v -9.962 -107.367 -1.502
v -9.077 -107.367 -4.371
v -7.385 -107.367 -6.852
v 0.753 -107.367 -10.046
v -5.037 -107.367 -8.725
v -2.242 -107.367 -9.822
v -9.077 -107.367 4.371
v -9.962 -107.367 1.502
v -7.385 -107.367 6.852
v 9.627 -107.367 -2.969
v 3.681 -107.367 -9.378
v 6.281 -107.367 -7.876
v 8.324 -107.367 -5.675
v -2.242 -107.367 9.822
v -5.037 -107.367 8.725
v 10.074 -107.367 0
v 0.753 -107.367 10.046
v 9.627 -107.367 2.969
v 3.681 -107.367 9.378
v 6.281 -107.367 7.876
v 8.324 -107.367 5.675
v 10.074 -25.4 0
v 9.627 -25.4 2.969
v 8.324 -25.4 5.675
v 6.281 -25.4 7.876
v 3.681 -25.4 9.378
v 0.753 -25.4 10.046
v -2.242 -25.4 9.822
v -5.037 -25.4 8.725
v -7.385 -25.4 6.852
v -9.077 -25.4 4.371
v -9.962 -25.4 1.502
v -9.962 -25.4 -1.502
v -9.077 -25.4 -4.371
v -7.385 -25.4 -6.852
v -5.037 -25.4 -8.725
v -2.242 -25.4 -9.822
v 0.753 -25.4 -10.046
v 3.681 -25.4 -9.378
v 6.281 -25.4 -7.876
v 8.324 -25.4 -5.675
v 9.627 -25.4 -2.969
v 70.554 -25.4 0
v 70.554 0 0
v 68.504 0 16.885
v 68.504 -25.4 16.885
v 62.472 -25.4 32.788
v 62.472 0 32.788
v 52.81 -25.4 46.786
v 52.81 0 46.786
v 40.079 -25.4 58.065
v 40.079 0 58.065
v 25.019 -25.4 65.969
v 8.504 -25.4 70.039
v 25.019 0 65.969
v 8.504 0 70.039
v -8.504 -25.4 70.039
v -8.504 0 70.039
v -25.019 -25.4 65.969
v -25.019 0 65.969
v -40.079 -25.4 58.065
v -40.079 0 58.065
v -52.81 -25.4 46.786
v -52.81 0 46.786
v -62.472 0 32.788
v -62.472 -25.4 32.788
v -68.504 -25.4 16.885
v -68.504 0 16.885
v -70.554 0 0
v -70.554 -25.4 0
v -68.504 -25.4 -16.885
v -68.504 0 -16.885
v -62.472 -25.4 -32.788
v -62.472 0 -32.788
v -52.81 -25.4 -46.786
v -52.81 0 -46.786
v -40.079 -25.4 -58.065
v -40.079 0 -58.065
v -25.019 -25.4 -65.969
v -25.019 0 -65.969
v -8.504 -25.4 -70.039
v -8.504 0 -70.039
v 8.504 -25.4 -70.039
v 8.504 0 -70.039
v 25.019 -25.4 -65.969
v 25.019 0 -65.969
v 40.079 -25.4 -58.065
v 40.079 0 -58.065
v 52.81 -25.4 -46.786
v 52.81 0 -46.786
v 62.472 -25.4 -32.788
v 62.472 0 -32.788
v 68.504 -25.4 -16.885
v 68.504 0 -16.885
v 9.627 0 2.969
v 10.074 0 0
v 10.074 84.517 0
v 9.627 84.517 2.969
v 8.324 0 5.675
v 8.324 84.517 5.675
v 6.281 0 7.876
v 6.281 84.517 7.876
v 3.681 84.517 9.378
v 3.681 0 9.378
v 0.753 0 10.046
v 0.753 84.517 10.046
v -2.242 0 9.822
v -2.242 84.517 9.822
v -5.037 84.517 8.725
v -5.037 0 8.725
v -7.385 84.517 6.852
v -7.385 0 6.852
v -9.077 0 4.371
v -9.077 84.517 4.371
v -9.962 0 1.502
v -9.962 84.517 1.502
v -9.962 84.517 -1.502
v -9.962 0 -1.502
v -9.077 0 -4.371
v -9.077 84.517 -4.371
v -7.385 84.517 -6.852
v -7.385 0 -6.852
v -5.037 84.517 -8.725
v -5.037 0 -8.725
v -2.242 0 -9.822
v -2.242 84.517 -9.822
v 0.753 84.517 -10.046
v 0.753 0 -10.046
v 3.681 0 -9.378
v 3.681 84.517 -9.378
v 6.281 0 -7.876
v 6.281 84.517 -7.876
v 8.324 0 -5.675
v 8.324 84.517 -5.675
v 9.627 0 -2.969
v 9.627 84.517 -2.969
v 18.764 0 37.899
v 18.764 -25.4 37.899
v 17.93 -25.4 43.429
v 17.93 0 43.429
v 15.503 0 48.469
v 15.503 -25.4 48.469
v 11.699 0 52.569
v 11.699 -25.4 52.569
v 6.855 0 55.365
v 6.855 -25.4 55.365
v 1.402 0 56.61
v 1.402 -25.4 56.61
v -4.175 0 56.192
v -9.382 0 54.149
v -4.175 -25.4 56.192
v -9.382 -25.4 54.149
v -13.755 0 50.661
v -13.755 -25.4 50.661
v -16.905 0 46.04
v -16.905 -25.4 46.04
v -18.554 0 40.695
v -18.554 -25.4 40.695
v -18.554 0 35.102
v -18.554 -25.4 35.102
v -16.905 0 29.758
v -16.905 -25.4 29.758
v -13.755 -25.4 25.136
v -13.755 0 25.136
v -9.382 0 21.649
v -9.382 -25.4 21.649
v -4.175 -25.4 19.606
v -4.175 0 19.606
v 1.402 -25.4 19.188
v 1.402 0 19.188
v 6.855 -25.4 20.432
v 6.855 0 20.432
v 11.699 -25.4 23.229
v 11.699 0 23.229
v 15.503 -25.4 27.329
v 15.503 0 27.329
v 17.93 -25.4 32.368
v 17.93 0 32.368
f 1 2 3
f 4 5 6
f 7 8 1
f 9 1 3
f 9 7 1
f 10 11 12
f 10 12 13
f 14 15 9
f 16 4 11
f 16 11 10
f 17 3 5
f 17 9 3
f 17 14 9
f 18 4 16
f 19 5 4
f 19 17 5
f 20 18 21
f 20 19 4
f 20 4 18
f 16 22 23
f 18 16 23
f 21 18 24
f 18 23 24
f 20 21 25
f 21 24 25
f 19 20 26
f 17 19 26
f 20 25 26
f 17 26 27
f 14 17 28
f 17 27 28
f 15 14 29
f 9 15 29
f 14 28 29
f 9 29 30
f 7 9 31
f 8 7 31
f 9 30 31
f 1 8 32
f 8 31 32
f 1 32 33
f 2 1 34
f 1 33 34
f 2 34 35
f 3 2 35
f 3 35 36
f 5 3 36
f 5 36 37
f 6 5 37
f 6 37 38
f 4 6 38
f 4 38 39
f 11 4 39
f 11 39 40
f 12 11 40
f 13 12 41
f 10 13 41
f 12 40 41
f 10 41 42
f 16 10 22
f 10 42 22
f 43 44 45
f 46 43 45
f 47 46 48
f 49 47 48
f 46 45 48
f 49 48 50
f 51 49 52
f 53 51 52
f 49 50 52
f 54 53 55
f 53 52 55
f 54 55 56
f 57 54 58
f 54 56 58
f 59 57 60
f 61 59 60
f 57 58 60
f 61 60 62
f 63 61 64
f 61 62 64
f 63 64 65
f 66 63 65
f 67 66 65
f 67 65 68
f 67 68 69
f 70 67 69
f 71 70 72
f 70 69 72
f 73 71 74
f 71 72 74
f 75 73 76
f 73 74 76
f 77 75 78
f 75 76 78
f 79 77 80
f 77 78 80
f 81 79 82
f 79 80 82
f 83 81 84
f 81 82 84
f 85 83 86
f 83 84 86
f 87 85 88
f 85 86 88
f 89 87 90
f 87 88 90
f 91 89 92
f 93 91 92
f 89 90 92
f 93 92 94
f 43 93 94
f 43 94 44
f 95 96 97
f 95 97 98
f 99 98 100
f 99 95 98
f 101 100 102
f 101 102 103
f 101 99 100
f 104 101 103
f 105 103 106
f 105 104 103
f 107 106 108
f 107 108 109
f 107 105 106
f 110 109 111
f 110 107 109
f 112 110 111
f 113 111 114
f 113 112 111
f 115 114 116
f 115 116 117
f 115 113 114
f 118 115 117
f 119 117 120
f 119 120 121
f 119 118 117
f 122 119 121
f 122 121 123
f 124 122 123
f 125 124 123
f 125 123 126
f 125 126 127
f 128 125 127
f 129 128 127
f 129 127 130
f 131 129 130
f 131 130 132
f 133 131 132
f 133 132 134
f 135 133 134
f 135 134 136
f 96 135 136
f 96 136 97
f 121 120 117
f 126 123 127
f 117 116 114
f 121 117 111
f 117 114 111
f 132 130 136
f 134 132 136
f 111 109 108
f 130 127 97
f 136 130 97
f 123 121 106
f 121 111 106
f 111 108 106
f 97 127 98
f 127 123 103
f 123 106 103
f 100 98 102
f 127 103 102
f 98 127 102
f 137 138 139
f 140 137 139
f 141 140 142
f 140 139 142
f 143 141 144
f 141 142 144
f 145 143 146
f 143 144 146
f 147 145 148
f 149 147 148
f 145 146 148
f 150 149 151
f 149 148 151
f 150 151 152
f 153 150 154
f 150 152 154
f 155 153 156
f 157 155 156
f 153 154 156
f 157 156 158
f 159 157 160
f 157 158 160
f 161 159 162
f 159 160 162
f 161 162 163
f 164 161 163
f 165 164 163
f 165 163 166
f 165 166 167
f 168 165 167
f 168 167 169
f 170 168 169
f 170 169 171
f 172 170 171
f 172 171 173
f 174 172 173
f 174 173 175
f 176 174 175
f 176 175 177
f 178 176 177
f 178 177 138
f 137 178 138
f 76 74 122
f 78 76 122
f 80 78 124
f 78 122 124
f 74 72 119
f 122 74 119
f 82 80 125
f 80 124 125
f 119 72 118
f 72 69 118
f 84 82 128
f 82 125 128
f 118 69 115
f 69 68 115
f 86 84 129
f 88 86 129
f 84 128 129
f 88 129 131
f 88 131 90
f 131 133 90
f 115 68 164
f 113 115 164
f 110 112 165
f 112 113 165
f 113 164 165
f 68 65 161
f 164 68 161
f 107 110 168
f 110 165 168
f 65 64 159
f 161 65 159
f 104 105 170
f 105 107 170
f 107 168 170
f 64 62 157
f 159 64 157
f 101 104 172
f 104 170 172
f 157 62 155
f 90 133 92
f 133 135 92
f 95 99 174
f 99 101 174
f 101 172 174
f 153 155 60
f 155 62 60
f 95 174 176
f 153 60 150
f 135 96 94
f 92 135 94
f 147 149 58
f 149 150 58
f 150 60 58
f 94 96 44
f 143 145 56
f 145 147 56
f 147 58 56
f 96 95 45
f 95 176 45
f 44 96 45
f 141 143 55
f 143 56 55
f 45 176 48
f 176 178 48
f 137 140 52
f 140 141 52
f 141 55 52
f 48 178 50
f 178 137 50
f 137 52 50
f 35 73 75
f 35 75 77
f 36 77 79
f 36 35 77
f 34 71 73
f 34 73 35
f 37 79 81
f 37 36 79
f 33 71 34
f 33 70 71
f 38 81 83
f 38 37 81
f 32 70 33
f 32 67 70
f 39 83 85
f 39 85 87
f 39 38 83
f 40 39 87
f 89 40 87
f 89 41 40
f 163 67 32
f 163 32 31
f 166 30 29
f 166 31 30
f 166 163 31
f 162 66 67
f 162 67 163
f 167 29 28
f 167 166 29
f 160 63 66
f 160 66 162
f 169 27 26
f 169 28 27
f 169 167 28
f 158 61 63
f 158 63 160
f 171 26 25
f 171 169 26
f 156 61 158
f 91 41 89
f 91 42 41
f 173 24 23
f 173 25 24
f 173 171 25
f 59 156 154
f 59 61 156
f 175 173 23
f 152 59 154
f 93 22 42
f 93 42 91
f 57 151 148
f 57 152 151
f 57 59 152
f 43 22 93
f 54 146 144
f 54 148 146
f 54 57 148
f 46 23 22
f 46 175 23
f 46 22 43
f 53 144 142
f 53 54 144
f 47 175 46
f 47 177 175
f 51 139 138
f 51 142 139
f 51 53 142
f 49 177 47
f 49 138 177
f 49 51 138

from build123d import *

# Parameters (mm, degrees)
F0_R          = 70.553851
F1_DEPTH      = 25.4
F2_R          = 18.763513
F3_DEPTH      = 61.607625
F4_R          = 10.074339
F5_DEPTH      = 81.966516
F5_DEPTH_BACK = 109.91749


with BuildPart() as f1:
    # F0 (on Front) → F1 (new body)
    with BuildSketch(Plane.XZ):
        Circle(F0_R)
    extrude(amount=F1_DEPTH)

    # F2 (on face) → F3 (cut)
    with BuildSketch(Plane.XZ.offset(25.4)):
        with Locations((0, 37.898846)):
            Circle(F2_R)
    extrude(amount=-F3_DEPTH, mode=Mode.SUBTRACT)

    # F4 (on face) → F5 (join, two sides)
    with BuildSketch(Plane.XZ.offset(25.4)) as f5_sk:
        Circle(F4_R)
    extrude(amount=F5_DEPTH)
    extrude(f5_sk.sketch, amount=-F5_DEPTH_BACK)


solid = f1.part
